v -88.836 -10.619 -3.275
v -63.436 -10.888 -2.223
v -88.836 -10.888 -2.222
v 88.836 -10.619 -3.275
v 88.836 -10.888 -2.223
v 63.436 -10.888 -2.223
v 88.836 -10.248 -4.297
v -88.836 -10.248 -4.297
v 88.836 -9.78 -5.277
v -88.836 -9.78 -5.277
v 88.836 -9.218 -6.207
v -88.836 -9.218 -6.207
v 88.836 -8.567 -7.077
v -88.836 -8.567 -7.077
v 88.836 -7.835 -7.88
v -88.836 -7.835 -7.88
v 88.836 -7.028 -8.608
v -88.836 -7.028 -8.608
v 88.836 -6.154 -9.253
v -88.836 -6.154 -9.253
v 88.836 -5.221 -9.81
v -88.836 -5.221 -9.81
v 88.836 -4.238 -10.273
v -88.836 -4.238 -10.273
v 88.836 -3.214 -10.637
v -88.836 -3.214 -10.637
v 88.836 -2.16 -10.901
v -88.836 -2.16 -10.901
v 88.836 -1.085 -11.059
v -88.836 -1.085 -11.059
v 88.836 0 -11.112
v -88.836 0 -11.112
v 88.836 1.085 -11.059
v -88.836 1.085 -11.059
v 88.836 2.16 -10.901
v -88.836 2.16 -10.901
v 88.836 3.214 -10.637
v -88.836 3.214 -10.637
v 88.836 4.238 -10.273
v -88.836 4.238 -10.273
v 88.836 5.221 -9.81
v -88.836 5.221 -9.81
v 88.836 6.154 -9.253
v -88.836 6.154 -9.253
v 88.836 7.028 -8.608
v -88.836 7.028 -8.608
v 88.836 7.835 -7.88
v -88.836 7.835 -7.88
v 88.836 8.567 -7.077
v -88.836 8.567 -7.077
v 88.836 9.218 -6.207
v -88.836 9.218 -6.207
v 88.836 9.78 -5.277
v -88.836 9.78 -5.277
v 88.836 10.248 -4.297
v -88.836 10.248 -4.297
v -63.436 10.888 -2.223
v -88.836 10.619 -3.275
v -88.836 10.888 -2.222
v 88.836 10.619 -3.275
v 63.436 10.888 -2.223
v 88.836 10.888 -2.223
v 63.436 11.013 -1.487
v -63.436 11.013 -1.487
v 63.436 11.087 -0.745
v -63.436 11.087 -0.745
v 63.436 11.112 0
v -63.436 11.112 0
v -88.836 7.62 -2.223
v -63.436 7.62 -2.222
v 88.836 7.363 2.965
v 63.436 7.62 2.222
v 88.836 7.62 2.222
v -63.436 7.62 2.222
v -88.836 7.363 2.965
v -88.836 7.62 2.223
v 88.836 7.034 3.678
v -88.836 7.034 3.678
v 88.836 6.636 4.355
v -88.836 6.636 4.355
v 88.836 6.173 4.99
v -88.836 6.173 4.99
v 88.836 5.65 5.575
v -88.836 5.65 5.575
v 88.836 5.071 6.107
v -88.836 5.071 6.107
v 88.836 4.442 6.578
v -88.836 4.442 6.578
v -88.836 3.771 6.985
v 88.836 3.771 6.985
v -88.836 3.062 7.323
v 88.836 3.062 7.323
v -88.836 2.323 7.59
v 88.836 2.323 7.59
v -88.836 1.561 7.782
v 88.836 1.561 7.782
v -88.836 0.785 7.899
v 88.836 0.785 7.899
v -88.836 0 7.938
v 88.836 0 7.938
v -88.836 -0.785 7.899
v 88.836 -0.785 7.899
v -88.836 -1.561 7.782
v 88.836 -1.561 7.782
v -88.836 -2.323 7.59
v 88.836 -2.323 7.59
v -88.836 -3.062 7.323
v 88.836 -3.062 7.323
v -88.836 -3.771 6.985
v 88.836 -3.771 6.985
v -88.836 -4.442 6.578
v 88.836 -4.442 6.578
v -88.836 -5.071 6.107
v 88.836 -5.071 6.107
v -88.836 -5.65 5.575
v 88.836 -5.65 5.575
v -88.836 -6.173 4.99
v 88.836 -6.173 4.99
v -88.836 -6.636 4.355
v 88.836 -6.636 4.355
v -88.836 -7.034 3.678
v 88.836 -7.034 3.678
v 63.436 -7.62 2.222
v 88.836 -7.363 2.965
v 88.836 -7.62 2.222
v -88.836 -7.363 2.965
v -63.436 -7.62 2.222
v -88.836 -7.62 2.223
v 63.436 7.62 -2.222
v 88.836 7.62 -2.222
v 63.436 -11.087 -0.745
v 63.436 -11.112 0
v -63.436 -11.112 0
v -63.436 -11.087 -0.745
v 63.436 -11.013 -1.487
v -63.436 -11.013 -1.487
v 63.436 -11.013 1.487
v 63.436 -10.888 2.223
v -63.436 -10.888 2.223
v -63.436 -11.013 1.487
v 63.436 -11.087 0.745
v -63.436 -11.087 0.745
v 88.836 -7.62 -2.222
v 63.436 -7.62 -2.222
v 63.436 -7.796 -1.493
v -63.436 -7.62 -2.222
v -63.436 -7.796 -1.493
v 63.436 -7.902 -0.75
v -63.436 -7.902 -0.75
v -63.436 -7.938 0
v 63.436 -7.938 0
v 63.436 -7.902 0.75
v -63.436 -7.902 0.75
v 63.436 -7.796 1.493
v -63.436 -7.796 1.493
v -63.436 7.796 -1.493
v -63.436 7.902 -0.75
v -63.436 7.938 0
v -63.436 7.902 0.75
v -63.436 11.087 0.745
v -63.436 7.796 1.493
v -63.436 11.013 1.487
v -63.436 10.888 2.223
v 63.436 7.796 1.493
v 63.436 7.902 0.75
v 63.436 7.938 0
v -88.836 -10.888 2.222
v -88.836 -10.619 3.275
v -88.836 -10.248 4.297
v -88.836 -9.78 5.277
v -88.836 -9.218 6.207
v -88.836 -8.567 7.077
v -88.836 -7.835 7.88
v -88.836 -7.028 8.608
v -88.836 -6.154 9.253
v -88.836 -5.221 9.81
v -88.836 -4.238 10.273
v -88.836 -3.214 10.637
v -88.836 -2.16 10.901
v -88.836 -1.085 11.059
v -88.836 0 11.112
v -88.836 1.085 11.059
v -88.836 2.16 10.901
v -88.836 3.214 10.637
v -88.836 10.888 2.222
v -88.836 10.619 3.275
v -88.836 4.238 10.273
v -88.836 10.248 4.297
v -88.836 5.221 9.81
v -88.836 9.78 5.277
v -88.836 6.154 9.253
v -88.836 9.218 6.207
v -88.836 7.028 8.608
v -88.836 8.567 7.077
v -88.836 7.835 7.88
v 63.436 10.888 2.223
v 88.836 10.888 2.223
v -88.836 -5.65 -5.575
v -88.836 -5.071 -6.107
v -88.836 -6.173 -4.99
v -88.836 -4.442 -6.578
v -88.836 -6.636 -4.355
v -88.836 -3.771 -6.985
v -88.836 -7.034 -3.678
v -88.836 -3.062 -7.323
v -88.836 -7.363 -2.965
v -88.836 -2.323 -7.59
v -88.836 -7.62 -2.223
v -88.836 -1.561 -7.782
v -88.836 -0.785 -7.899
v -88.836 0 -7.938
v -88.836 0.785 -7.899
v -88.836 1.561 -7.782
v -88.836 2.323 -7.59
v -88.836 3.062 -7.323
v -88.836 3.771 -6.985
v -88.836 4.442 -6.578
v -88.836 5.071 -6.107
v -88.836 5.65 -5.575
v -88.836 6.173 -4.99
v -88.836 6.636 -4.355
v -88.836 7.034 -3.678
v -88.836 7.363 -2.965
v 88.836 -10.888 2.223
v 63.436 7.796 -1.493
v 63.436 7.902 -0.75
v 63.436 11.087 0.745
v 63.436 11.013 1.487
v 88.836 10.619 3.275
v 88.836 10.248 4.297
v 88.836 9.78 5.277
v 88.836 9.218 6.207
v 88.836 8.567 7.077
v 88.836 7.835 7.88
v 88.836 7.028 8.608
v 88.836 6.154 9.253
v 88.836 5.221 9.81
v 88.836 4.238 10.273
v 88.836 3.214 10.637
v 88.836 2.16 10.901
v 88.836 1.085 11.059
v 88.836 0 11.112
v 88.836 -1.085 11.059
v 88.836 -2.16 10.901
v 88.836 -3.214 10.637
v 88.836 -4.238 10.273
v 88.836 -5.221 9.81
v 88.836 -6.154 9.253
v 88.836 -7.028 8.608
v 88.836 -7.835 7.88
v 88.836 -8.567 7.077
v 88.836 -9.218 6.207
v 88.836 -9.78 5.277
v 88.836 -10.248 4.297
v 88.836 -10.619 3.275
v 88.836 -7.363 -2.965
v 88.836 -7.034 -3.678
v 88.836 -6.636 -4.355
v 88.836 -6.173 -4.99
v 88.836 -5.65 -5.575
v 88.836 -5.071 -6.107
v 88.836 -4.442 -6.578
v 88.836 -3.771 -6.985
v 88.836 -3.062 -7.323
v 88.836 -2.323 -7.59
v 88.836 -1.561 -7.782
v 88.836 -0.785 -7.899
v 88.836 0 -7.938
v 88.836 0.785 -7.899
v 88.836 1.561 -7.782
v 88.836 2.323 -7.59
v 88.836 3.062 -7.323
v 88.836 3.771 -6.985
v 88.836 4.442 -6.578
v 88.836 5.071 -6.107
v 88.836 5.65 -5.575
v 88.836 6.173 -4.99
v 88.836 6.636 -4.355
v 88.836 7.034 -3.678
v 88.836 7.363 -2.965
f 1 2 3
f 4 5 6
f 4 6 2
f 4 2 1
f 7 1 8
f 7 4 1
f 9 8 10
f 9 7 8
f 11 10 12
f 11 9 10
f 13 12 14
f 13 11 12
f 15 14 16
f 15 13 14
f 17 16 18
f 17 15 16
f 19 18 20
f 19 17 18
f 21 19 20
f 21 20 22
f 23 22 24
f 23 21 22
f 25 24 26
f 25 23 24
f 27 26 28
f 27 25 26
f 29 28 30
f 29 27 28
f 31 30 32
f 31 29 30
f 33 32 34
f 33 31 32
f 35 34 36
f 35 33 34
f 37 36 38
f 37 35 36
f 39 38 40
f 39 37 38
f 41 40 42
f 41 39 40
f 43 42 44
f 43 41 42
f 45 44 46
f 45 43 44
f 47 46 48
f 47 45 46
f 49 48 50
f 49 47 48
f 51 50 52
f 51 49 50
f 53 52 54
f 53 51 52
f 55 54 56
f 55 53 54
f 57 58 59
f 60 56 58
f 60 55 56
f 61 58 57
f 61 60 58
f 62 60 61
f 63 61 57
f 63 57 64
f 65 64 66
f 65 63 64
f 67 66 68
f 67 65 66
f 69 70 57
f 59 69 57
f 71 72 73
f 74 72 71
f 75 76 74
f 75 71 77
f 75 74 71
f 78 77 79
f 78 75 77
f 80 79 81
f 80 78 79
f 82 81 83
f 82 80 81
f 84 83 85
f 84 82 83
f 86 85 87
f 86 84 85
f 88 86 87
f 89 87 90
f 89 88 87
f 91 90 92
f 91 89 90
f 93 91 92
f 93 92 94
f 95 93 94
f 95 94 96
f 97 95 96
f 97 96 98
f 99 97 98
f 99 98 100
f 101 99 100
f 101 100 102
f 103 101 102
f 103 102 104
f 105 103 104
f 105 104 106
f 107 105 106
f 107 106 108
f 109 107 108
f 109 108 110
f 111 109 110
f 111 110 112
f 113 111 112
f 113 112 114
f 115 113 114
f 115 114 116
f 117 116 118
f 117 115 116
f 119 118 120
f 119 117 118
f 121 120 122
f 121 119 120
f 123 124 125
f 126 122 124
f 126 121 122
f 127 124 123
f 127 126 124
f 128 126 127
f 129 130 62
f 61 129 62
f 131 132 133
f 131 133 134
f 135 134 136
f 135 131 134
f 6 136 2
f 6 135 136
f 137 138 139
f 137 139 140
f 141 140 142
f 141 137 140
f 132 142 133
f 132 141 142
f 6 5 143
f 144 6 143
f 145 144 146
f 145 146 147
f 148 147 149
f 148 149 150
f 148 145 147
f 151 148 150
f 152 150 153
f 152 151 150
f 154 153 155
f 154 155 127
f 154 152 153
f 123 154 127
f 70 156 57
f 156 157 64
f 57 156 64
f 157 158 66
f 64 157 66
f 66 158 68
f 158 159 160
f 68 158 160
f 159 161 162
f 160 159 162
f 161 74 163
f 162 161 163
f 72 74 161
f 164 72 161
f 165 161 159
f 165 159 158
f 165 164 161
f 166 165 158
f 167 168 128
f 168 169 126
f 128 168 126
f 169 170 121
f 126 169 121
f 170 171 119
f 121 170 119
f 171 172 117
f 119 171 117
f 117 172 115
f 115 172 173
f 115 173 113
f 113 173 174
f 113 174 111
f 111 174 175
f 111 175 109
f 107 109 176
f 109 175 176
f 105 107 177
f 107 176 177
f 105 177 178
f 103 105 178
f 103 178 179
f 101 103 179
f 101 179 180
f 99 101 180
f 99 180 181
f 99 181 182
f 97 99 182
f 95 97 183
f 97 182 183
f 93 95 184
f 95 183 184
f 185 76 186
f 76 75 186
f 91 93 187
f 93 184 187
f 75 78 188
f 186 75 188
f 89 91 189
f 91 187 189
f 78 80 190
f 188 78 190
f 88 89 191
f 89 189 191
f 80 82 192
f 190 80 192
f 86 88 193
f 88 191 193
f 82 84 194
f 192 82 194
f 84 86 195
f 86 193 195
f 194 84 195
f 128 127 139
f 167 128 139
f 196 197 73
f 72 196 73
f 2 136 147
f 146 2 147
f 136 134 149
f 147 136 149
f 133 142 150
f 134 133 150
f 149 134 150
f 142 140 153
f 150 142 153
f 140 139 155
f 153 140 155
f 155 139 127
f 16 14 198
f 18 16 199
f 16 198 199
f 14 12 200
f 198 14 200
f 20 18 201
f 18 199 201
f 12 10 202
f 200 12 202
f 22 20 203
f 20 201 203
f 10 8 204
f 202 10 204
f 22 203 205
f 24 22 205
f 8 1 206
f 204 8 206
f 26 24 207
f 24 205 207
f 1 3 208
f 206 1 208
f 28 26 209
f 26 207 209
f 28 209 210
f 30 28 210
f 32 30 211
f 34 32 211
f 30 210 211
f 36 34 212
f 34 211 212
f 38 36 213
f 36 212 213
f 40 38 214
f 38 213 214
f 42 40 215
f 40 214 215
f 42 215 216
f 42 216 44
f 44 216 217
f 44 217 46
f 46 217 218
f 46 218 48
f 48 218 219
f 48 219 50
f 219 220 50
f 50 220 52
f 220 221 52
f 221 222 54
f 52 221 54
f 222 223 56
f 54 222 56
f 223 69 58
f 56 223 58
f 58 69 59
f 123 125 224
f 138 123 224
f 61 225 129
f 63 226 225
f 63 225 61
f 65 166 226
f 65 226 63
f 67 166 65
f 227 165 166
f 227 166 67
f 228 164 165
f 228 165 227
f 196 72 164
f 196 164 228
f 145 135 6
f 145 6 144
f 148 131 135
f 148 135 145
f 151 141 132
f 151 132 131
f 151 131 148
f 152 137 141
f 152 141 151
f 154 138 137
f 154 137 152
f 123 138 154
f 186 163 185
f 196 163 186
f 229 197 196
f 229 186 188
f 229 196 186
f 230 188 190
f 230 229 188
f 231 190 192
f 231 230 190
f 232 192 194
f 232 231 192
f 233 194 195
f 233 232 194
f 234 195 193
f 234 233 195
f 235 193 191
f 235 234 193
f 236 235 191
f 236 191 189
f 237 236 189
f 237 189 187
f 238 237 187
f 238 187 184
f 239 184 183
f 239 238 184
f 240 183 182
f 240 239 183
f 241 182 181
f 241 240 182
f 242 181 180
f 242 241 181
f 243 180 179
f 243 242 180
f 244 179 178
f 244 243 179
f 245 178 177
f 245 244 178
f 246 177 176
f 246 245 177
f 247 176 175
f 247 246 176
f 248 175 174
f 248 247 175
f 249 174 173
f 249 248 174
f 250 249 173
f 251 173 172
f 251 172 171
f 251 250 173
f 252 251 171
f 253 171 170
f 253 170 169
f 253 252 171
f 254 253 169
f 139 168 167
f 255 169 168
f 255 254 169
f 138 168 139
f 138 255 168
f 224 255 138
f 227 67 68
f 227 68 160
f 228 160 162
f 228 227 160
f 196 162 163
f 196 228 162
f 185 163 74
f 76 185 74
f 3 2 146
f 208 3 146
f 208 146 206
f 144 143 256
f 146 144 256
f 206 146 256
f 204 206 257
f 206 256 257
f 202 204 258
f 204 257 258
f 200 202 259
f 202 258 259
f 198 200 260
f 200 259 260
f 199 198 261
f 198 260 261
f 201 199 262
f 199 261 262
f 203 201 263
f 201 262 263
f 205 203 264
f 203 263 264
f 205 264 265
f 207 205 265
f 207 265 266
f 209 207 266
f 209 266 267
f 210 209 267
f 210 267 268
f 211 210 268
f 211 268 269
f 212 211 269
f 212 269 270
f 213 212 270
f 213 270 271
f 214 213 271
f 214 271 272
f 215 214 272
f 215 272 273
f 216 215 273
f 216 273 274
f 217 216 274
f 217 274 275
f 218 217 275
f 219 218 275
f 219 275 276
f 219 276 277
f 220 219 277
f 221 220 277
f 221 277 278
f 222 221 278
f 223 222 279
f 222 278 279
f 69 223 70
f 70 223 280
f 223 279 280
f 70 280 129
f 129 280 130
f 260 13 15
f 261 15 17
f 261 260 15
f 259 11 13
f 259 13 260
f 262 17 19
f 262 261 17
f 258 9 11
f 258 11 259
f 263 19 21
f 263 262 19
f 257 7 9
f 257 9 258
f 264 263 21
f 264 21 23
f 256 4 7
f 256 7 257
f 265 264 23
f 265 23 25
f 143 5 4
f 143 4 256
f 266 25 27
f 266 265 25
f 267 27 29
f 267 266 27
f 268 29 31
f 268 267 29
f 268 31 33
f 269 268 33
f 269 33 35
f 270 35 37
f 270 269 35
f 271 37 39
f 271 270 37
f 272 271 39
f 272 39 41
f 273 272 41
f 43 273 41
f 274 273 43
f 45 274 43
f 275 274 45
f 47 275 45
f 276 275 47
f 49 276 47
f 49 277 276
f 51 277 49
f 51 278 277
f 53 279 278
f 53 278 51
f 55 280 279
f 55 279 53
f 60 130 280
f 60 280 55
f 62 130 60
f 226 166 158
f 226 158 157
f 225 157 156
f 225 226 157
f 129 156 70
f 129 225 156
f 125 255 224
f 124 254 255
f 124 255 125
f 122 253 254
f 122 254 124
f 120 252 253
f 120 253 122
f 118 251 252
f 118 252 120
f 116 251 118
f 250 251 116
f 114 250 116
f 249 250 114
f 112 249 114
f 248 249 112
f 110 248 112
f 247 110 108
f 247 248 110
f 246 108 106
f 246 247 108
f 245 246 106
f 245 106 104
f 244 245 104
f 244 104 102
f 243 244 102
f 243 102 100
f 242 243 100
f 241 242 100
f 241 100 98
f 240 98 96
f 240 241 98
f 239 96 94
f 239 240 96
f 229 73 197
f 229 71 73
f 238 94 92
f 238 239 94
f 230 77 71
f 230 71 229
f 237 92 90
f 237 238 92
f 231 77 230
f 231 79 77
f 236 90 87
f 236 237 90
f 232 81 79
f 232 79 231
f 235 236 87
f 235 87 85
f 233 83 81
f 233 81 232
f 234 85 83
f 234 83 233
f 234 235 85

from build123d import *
from build123d import SkipClean  # not in build123d's __all__

# Parameters (mm, degrees)
F0_R          = 11.1125
F0_R_2        = 7.9375
F1_DEPTH      = 88.8365
F1_DEPTH_BACK = 88.8365
F3_DEPTH      = 177.674
F4_DEPTH      = 152.273
F5_DEPTH      = 25.4


with BuildPart() as f1:
    # F0 (on Right) → F1 (new body, two sides)
    with BuildSketch(Plane.YZ) as f1_sk:
        Circle(F0_R)
        Circle(F0_R_2, mode=Mode.SUBTRACT)
    extrude(amount=F1_DEPTH)
    extrude(f1_sk.sketch, amount=-F1_DEPTH_BACK)

    # F2 (on face) → F3 (cut, through all)
    with BuildSketch(Plane.YZ.offset(88.8365)):
        with BuildLine():
            Line((-7.62, 2.2225), (-10.8879819067, 2.2225))
            ThreePointArc((-10.8879819067, 2.2225), (-11.0562280003, 1.1169058403), (-11.1125, 0))
            ThreePointArc((-11.1125, 0), (-11.0562280003, -1.1169058403), (-10.8879819067, -2.2225))
            Line((-10.8879819067, -2.2225), (-7.62, -2.2225))
            ThreePointArc((-7.62, -2.2225), (-7.9375, 0), (-7.62, 2.2225))
        make_face()
        with BuildLine():
            ThreePointArc((11.1125, 0), (11.0562280003, 1.1169058403), (10.8879819067, 2.2225))
            Line((10.8879819067, 2.2225), (7.62, 2.2225))
            ThreePointArc((7.62, 2.2225), (7.8577241059, 1.1225320151), (7.9375, 0))
            ThreePointArc((7.9375, 0), (7.8577241059, -1.1225320151), (7.62, -2.2225))
            Line((7.62, -2.2225), (10.8879819067, -2.2225))
            ThreePointArc((10.8879819067, -2.2225), (11.0562280003, -1.1169058403), (11.1125, 0))
        make_face()
    extrude(amount=-F3_DEPTH, mode=Mode.SUBTRACT)

    # F2 (on face) → F4 (join)
    with BuildSketch(Plane.YZ.offset(88.8365)):
        with BuildLine():
            Line((-7.62, 2.2225), (-10.8879819067, 2.2225))
            ThreePointArc((-10.8879819067, 2.2225), (-11.0562280003, 1.1169058403), (-11.1125, 0))
            ThreePointArc((-11.1125, 0), (-11.0562280003, -1.1169058403), (-10.8879819067, -2.2225))
            Line((-10.8879819067, -2.2225), (-7.62, -2.2225))
            ThreePointArc((-7.62, -2.2225), (-7.9375, 0), (-7.62, 2.2225))
        make_face()
        with BuildLine():
            ThreePointArc((11.1125, 0), (11.0562280003, 1.1169058403), (10.8879819067, 2.2225))
            Line((10.8879819067, 2.2225), (7.62, 2.2225))
            ThreePointArc((7.62, 2.2225), (7.8577241059, 1.1225320151), (7.9375, 0))
            ThreePointArc((7.9375, 0), (7.8577241059, -1.1225320151), (7.62, -2.2225))
            Line((7.62, -2.2225), (10.8879819067, -2.2225))
            ThreePointArc((10.8879819067, -2.2225), (11.0562280003, -1.1169058403), (11.1125, 0))
        make_face()
    with SkipClean():  # cleaning this boolean's faces spoils the solid; the shape is the same uncleaned
        extrude(amount=-F4_DEPTH)

    # F2 (on face) → F5 (cut)
    with BuildSketch(Plane.YZ.offset(88.8365)):
        with BuildLine():
            Line((-7.62, 2.2225), (-10.8879819067, 2.2225))
            ThreePointArc((-10.8879819067, 2.2225), (-11.0562280003, 1.1169058403), (-11.1125, 0))
            ThreePointArc((-11.1125, 0), (-11.0562280003, -1.1169058403), (-10.8879819067, -2.2225))
            Line((-10.8879819067, -2.2225), (-7.62, -2.2225))
            ThreePointArc((-7.62, -2.2225), (-7.9375, 0), (-7.62, 2.2225))
        make_face()
        with BuildLine():
            ThreePointArc((11.1125, 0), (11.0562280003, 1.1169058403), (10.8879819067, 2.2225))
            Line((10.8879819067, 2.2225), (7.62, 2.2225))
            ThreePointArc((7.62, 2.2225), (7.8577241059, 1.1225320151), (7.9375, 0))
            ThreePointArc((7.9375, 0), (7.8577241059, -1.1225320151), (7.62, -2.2225))
            Line((7.62, -2.2225), (10.8879819067, -2.2225))
            ThreePointArc((10.8879819067, -2.2225), (11.0562280003, -1.1169058403), (11.1125, 0))
        make_face()
    with SkipClean():  # cleaning this boolean's faces spoils the solid; the shape is the same uncleaned
        extrude(amount=-F5_DEPTH, mode=Mode.SUBTRACT)


solid = f1.part
